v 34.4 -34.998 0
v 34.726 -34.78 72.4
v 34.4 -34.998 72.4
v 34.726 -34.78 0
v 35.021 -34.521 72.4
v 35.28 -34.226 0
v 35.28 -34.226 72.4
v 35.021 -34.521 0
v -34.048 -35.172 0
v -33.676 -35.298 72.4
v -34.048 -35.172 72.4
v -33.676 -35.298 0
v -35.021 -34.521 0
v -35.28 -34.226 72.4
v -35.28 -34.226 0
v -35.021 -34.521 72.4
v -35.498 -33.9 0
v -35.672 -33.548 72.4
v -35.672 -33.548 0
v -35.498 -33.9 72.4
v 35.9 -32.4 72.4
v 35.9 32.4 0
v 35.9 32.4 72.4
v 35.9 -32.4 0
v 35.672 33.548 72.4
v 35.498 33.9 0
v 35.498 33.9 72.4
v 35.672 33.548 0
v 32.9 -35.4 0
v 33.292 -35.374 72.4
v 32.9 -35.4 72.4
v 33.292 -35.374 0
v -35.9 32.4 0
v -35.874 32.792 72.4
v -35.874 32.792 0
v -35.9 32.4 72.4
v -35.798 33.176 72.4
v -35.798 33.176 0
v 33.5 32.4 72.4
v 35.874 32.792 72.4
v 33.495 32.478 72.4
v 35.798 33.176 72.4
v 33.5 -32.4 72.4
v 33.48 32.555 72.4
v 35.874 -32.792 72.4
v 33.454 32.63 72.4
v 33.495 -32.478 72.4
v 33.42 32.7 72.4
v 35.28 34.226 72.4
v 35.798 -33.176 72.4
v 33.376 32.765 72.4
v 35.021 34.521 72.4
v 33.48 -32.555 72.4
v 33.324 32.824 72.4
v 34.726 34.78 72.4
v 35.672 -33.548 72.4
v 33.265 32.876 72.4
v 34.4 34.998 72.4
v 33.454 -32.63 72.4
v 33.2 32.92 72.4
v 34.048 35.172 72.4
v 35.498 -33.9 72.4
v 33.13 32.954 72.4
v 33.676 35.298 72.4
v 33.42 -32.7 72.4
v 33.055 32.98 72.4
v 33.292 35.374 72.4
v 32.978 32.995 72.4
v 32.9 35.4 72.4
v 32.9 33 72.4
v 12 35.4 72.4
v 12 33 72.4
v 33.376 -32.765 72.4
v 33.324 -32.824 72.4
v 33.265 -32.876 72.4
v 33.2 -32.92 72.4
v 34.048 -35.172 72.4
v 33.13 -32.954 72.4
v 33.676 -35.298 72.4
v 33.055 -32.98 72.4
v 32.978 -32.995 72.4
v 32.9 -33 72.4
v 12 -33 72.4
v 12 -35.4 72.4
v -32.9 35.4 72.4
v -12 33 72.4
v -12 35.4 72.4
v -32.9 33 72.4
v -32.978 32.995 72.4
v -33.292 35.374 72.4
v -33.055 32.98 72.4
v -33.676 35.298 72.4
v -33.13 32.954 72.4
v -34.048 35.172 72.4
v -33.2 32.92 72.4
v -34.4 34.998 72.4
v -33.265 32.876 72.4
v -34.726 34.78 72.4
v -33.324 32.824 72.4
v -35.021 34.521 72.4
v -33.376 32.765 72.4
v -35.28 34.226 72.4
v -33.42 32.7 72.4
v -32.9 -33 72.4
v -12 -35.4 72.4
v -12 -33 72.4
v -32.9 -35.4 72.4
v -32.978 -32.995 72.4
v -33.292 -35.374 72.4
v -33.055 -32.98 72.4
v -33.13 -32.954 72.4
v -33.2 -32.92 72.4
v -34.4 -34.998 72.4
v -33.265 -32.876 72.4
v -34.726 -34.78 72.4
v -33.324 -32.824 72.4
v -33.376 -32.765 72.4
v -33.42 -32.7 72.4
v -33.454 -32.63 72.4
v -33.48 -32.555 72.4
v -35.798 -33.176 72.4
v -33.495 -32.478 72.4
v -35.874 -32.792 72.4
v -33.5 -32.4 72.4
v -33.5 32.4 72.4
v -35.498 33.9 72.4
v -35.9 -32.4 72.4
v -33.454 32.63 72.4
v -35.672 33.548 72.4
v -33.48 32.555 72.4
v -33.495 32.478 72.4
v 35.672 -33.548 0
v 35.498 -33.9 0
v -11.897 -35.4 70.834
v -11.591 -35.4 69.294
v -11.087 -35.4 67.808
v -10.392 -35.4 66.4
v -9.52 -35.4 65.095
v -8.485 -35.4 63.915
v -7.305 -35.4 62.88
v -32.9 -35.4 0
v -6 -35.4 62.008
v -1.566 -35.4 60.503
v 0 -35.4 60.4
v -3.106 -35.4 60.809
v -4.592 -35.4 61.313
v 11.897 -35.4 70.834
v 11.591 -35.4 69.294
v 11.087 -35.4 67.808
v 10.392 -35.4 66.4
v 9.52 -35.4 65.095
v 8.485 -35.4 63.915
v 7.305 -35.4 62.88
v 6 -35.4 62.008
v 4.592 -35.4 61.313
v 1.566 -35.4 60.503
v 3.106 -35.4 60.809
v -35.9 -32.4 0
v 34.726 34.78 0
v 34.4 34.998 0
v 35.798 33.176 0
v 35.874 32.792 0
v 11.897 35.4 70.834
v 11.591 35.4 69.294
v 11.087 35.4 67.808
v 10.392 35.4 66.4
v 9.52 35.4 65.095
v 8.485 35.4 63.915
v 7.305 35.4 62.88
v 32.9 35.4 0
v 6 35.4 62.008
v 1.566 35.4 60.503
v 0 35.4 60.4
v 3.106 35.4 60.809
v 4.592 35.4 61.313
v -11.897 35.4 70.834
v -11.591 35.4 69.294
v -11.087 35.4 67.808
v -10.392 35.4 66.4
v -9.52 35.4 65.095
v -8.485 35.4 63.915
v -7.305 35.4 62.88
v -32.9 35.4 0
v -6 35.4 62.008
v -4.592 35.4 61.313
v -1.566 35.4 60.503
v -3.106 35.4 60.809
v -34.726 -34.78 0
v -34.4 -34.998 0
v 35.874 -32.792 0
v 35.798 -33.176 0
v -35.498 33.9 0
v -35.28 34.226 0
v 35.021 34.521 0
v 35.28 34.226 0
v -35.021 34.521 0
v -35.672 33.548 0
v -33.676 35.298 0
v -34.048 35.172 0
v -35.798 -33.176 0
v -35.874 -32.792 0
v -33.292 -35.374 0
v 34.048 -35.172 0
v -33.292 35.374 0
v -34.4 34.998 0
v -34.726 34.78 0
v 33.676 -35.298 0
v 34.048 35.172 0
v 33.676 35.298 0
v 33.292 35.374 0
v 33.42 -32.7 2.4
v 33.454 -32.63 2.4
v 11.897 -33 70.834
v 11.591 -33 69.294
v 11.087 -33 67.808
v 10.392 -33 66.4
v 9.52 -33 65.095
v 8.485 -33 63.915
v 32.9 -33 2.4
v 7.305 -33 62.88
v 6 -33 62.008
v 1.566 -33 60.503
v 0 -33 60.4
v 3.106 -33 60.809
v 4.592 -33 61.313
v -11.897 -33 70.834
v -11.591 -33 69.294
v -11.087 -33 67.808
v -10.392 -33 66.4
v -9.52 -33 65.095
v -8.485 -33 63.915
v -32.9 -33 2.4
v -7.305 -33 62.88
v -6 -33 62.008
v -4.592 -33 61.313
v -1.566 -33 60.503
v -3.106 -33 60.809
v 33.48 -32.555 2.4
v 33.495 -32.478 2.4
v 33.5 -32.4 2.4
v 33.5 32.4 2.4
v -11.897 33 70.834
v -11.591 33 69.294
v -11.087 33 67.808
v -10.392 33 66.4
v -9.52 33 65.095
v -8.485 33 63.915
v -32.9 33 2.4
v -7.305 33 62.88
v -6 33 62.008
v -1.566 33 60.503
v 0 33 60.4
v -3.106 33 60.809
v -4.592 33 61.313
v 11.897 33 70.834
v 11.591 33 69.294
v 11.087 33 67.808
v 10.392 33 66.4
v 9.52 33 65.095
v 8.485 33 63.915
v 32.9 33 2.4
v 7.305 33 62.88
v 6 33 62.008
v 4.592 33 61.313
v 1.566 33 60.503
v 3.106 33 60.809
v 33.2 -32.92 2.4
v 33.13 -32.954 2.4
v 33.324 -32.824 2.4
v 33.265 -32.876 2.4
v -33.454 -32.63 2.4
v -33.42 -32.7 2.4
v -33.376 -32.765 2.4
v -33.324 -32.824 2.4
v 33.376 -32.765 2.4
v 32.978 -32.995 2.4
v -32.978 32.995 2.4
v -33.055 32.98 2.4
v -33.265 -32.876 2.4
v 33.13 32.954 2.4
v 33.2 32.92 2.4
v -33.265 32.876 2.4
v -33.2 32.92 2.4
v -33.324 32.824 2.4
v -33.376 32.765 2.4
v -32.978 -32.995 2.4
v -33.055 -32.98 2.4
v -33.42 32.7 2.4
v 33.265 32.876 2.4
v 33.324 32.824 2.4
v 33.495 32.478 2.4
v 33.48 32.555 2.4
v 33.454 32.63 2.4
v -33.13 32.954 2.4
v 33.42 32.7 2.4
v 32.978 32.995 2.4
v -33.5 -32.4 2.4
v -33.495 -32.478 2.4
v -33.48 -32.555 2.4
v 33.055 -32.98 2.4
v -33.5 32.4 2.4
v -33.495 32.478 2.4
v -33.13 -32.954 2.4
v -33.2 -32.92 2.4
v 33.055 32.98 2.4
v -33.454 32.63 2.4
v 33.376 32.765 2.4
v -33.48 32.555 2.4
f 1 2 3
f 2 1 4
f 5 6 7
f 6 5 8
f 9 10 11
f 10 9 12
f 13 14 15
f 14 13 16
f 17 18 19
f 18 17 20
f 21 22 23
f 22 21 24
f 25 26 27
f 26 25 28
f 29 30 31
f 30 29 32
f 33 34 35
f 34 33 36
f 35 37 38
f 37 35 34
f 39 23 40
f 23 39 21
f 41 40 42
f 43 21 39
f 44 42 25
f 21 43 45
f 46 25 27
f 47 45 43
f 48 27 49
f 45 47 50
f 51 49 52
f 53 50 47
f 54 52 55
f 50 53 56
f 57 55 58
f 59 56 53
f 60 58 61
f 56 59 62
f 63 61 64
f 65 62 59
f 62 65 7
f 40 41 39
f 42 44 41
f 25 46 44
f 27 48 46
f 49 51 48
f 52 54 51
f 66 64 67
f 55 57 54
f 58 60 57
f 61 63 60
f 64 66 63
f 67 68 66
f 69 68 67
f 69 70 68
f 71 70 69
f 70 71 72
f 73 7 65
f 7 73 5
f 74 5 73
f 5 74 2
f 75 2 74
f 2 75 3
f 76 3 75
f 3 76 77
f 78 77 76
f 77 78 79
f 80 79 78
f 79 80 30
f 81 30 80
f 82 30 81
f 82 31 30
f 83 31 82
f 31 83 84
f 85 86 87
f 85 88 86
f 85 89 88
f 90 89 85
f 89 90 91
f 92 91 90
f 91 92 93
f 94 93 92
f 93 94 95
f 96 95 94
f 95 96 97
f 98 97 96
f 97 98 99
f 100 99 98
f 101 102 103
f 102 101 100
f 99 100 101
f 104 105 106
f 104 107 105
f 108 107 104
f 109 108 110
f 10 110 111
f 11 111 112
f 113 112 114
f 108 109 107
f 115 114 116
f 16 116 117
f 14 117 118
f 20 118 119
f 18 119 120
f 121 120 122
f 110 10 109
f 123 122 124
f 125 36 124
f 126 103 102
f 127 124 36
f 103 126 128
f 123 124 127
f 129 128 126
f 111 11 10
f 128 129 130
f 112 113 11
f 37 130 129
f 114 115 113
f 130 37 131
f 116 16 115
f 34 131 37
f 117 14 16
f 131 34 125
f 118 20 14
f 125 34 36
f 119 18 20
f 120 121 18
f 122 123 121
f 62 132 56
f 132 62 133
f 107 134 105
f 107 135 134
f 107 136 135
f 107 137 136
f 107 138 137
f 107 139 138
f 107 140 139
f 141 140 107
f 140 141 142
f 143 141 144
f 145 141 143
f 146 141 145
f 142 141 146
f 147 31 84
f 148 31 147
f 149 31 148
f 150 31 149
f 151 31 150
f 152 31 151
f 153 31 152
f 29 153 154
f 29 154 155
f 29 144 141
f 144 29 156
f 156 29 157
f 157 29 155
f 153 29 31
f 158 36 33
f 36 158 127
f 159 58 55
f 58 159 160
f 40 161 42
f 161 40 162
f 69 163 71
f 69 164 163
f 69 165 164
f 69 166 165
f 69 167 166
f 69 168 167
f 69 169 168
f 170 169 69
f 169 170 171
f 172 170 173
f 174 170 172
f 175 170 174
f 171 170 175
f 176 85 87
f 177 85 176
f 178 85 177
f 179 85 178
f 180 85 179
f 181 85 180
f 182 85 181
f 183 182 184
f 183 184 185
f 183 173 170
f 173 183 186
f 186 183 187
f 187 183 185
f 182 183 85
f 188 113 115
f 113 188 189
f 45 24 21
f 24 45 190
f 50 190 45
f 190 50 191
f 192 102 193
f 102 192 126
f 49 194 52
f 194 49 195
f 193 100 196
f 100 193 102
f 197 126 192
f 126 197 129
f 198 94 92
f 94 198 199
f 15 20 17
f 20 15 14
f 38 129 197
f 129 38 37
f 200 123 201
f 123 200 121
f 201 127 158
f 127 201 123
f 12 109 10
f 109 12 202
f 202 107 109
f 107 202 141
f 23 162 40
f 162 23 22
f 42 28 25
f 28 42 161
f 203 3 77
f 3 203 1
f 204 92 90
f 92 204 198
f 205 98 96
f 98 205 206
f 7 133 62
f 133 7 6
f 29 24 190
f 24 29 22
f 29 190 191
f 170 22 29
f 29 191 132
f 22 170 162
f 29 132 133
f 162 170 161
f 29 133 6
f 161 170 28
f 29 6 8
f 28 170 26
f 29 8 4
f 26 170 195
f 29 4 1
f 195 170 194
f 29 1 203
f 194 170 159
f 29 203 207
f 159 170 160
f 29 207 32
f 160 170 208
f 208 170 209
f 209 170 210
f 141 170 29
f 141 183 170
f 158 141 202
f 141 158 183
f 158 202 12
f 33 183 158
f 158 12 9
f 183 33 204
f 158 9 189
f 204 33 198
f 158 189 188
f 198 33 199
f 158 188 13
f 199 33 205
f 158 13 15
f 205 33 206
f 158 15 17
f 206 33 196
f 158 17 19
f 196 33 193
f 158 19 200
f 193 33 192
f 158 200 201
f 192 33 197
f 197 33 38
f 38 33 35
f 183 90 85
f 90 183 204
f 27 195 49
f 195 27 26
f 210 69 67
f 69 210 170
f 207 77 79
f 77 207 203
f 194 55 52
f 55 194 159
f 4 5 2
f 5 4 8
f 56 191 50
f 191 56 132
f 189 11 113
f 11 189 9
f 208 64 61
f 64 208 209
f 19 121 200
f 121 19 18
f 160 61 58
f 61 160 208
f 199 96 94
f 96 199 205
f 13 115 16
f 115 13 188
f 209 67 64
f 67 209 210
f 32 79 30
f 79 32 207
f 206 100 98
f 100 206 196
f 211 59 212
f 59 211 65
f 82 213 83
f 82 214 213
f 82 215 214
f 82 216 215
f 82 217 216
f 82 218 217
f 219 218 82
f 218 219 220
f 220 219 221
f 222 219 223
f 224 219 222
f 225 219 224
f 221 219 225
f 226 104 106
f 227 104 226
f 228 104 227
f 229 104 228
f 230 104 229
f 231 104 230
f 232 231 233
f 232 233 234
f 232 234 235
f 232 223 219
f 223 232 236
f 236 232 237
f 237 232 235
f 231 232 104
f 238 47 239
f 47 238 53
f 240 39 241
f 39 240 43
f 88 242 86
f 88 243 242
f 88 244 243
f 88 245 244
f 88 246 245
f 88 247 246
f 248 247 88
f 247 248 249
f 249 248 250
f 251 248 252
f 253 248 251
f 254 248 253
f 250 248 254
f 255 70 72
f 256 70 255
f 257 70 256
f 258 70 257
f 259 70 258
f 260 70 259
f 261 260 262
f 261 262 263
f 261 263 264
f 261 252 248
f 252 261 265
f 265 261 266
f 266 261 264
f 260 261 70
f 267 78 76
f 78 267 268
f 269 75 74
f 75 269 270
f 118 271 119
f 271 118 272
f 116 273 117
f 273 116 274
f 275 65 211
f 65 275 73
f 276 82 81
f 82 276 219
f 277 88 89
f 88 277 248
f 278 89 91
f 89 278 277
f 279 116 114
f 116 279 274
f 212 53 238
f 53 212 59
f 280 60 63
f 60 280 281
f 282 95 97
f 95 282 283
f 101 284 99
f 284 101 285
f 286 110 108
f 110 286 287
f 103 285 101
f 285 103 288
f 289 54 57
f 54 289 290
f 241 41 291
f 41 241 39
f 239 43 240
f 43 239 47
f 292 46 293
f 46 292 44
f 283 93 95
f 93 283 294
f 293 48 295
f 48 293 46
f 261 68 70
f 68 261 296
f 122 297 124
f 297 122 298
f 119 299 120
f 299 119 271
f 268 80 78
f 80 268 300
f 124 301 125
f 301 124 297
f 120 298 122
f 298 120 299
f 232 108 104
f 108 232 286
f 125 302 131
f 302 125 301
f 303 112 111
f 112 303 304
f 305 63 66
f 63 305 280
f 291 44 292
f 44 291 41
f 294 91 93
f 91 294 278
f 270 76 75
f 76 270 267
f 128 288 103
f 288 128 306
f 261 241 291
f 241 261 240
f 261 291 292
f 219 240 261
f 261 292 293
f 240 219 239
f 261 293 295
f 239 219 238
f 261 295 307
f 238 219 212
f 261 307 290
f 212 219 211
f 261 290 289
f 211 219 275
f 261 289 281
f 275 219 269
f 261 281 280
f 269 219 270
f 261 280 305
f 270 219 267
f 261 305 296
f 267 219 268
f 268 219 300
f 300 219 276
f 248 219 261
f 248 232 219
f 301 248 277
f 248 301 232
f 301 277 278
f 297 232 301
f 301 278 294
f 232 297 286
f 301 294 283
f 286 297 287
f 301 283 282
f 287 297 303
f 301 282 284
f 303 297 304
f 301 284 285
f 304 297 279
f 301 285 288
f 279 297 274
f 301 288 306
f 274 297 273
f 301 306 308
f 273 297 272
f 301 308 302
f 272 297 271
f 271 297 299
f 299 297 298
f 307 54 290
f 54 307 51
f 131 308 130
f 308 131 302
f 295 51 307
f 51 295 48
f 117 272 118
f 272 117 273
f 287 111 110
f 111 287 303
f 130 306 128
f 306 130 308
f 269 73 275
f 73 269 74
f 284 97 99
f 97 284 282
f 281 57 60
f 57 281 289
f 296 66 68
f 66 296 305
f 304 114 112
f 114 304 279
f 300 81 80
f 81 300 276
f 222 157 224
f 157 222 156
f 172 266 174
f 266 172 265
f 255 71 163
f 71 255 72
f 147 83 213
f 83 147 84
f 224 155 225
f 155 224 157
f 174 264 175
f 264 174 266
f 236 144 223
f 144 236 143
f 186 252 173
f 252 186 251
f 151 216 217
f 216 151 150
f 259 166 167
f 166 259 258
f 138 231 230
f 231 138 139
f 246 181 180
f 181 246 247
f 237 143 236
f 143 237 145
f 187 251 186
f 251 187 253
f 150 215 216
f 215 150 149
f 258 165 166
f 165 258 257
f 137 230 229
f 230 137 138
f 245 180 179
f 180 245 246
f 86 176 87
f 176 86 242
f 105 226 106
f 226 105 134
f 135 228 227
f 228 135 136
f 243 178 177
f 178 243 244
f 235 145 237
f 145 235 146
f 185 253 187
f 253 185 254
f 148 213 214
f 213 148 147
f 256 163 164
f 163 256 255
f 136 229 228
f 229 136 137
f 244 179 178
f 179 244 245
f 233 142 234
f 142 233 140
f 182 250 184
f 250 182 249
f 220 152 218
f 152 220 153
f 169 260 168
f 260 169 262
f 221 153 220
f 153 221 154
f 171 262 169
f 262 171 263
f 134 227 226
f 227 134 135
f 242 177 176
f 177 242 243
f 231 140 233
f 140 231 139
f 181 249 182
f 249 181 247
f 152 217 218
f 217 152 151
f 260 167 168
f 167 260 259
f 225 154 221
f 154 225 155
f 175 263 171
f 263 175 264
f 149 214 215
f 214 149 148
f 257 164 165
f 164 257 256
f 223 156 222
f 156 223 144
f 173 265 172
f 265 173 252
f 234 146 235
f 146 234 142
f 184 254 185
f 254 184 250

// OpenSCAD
// Snug-fit card deck box (base + sliding cap) - original parametric design.
// Sizes are SLEEVED cards: standard TCG/poker 66 x 91, mini Euro 47 x 71, tarot 73 x 123.
// Cards stand on edge; the cap slides over the top `ov` mm of the base. Both parts print open side up, no supports.
part    = "base";  // "base" | "cap"
card_w  = 66;      // sleeved card width (mm)
card_h  = 91;      // sleeved card height (mm)
cards   = 100;     // number of sleeved cards
thk     = 0.65;    // thickness of one sleeved card (mm)
clr     = 1.0;     // free play around the stack (mm)
wall    = 2.4;
floor_t = 2.4;
top_t   = 2.4;
fit     = 0.3;     // gap between base and cap walls (FDM friction fit)
ov      = 22;      // how far the cap slides down over the base (mm)
notch_r = 12;      // thumb notch radius in the front/back walls
$fn = 48;

iw = card_w + clr;            // inner width
id = cards * thk + clr;       // inner depth (stack thickness)
ih = card_h + clr;            // inner height available for the cards
bw = iw + 2*wall;             // base outer width
bd = id + 2*wall;             // base outer depth
bh = floor_t + ih - ov;       // base outer height (cards stick out `ov` into the cap)
r  = 3;                       // vertical corner radius
echo(str("DECK_BOX base=", bw, "x", bd, "x", bh, " cap=", bw + 2*(fit+wall), "x", bd + 2*(fit+wall), "x", ov + top_t));

module rbox(w, d, h, rr) {
    hull() for (sx = [-1, 1], sy = [-1, 1])
        translate([sx*(w/2 - rr), sy*(d/2 - rr), 0]) cylinder(r = rr, h = h);
}

module base() {
    difference() {
        rbox(bw, bd, bh, r);
        translate([0, 0, floor_t]) rbox(iw, id, bh, max(r - wall, 0.6));
        // thumb notch through the front and back walls, centred on the rim
        translate([0, 0, bh]) rotate([90, 0, 0]) cylinder(r = notch_r, h = bd + 2, center = true);
    }
}

module cap() {
    cw = bw + 2*fit; cd = bd + 2*fit;
    difference() {
        rbox(cw + 2*wall, cd + 2*wall, ov + top_t, r + fit + wall - 0.0);
        translate([0, 0, top_t]) rbox(cw, cd, ov + 1, r + fit);
    }
}

if (part == "cap") cap(); else base();
